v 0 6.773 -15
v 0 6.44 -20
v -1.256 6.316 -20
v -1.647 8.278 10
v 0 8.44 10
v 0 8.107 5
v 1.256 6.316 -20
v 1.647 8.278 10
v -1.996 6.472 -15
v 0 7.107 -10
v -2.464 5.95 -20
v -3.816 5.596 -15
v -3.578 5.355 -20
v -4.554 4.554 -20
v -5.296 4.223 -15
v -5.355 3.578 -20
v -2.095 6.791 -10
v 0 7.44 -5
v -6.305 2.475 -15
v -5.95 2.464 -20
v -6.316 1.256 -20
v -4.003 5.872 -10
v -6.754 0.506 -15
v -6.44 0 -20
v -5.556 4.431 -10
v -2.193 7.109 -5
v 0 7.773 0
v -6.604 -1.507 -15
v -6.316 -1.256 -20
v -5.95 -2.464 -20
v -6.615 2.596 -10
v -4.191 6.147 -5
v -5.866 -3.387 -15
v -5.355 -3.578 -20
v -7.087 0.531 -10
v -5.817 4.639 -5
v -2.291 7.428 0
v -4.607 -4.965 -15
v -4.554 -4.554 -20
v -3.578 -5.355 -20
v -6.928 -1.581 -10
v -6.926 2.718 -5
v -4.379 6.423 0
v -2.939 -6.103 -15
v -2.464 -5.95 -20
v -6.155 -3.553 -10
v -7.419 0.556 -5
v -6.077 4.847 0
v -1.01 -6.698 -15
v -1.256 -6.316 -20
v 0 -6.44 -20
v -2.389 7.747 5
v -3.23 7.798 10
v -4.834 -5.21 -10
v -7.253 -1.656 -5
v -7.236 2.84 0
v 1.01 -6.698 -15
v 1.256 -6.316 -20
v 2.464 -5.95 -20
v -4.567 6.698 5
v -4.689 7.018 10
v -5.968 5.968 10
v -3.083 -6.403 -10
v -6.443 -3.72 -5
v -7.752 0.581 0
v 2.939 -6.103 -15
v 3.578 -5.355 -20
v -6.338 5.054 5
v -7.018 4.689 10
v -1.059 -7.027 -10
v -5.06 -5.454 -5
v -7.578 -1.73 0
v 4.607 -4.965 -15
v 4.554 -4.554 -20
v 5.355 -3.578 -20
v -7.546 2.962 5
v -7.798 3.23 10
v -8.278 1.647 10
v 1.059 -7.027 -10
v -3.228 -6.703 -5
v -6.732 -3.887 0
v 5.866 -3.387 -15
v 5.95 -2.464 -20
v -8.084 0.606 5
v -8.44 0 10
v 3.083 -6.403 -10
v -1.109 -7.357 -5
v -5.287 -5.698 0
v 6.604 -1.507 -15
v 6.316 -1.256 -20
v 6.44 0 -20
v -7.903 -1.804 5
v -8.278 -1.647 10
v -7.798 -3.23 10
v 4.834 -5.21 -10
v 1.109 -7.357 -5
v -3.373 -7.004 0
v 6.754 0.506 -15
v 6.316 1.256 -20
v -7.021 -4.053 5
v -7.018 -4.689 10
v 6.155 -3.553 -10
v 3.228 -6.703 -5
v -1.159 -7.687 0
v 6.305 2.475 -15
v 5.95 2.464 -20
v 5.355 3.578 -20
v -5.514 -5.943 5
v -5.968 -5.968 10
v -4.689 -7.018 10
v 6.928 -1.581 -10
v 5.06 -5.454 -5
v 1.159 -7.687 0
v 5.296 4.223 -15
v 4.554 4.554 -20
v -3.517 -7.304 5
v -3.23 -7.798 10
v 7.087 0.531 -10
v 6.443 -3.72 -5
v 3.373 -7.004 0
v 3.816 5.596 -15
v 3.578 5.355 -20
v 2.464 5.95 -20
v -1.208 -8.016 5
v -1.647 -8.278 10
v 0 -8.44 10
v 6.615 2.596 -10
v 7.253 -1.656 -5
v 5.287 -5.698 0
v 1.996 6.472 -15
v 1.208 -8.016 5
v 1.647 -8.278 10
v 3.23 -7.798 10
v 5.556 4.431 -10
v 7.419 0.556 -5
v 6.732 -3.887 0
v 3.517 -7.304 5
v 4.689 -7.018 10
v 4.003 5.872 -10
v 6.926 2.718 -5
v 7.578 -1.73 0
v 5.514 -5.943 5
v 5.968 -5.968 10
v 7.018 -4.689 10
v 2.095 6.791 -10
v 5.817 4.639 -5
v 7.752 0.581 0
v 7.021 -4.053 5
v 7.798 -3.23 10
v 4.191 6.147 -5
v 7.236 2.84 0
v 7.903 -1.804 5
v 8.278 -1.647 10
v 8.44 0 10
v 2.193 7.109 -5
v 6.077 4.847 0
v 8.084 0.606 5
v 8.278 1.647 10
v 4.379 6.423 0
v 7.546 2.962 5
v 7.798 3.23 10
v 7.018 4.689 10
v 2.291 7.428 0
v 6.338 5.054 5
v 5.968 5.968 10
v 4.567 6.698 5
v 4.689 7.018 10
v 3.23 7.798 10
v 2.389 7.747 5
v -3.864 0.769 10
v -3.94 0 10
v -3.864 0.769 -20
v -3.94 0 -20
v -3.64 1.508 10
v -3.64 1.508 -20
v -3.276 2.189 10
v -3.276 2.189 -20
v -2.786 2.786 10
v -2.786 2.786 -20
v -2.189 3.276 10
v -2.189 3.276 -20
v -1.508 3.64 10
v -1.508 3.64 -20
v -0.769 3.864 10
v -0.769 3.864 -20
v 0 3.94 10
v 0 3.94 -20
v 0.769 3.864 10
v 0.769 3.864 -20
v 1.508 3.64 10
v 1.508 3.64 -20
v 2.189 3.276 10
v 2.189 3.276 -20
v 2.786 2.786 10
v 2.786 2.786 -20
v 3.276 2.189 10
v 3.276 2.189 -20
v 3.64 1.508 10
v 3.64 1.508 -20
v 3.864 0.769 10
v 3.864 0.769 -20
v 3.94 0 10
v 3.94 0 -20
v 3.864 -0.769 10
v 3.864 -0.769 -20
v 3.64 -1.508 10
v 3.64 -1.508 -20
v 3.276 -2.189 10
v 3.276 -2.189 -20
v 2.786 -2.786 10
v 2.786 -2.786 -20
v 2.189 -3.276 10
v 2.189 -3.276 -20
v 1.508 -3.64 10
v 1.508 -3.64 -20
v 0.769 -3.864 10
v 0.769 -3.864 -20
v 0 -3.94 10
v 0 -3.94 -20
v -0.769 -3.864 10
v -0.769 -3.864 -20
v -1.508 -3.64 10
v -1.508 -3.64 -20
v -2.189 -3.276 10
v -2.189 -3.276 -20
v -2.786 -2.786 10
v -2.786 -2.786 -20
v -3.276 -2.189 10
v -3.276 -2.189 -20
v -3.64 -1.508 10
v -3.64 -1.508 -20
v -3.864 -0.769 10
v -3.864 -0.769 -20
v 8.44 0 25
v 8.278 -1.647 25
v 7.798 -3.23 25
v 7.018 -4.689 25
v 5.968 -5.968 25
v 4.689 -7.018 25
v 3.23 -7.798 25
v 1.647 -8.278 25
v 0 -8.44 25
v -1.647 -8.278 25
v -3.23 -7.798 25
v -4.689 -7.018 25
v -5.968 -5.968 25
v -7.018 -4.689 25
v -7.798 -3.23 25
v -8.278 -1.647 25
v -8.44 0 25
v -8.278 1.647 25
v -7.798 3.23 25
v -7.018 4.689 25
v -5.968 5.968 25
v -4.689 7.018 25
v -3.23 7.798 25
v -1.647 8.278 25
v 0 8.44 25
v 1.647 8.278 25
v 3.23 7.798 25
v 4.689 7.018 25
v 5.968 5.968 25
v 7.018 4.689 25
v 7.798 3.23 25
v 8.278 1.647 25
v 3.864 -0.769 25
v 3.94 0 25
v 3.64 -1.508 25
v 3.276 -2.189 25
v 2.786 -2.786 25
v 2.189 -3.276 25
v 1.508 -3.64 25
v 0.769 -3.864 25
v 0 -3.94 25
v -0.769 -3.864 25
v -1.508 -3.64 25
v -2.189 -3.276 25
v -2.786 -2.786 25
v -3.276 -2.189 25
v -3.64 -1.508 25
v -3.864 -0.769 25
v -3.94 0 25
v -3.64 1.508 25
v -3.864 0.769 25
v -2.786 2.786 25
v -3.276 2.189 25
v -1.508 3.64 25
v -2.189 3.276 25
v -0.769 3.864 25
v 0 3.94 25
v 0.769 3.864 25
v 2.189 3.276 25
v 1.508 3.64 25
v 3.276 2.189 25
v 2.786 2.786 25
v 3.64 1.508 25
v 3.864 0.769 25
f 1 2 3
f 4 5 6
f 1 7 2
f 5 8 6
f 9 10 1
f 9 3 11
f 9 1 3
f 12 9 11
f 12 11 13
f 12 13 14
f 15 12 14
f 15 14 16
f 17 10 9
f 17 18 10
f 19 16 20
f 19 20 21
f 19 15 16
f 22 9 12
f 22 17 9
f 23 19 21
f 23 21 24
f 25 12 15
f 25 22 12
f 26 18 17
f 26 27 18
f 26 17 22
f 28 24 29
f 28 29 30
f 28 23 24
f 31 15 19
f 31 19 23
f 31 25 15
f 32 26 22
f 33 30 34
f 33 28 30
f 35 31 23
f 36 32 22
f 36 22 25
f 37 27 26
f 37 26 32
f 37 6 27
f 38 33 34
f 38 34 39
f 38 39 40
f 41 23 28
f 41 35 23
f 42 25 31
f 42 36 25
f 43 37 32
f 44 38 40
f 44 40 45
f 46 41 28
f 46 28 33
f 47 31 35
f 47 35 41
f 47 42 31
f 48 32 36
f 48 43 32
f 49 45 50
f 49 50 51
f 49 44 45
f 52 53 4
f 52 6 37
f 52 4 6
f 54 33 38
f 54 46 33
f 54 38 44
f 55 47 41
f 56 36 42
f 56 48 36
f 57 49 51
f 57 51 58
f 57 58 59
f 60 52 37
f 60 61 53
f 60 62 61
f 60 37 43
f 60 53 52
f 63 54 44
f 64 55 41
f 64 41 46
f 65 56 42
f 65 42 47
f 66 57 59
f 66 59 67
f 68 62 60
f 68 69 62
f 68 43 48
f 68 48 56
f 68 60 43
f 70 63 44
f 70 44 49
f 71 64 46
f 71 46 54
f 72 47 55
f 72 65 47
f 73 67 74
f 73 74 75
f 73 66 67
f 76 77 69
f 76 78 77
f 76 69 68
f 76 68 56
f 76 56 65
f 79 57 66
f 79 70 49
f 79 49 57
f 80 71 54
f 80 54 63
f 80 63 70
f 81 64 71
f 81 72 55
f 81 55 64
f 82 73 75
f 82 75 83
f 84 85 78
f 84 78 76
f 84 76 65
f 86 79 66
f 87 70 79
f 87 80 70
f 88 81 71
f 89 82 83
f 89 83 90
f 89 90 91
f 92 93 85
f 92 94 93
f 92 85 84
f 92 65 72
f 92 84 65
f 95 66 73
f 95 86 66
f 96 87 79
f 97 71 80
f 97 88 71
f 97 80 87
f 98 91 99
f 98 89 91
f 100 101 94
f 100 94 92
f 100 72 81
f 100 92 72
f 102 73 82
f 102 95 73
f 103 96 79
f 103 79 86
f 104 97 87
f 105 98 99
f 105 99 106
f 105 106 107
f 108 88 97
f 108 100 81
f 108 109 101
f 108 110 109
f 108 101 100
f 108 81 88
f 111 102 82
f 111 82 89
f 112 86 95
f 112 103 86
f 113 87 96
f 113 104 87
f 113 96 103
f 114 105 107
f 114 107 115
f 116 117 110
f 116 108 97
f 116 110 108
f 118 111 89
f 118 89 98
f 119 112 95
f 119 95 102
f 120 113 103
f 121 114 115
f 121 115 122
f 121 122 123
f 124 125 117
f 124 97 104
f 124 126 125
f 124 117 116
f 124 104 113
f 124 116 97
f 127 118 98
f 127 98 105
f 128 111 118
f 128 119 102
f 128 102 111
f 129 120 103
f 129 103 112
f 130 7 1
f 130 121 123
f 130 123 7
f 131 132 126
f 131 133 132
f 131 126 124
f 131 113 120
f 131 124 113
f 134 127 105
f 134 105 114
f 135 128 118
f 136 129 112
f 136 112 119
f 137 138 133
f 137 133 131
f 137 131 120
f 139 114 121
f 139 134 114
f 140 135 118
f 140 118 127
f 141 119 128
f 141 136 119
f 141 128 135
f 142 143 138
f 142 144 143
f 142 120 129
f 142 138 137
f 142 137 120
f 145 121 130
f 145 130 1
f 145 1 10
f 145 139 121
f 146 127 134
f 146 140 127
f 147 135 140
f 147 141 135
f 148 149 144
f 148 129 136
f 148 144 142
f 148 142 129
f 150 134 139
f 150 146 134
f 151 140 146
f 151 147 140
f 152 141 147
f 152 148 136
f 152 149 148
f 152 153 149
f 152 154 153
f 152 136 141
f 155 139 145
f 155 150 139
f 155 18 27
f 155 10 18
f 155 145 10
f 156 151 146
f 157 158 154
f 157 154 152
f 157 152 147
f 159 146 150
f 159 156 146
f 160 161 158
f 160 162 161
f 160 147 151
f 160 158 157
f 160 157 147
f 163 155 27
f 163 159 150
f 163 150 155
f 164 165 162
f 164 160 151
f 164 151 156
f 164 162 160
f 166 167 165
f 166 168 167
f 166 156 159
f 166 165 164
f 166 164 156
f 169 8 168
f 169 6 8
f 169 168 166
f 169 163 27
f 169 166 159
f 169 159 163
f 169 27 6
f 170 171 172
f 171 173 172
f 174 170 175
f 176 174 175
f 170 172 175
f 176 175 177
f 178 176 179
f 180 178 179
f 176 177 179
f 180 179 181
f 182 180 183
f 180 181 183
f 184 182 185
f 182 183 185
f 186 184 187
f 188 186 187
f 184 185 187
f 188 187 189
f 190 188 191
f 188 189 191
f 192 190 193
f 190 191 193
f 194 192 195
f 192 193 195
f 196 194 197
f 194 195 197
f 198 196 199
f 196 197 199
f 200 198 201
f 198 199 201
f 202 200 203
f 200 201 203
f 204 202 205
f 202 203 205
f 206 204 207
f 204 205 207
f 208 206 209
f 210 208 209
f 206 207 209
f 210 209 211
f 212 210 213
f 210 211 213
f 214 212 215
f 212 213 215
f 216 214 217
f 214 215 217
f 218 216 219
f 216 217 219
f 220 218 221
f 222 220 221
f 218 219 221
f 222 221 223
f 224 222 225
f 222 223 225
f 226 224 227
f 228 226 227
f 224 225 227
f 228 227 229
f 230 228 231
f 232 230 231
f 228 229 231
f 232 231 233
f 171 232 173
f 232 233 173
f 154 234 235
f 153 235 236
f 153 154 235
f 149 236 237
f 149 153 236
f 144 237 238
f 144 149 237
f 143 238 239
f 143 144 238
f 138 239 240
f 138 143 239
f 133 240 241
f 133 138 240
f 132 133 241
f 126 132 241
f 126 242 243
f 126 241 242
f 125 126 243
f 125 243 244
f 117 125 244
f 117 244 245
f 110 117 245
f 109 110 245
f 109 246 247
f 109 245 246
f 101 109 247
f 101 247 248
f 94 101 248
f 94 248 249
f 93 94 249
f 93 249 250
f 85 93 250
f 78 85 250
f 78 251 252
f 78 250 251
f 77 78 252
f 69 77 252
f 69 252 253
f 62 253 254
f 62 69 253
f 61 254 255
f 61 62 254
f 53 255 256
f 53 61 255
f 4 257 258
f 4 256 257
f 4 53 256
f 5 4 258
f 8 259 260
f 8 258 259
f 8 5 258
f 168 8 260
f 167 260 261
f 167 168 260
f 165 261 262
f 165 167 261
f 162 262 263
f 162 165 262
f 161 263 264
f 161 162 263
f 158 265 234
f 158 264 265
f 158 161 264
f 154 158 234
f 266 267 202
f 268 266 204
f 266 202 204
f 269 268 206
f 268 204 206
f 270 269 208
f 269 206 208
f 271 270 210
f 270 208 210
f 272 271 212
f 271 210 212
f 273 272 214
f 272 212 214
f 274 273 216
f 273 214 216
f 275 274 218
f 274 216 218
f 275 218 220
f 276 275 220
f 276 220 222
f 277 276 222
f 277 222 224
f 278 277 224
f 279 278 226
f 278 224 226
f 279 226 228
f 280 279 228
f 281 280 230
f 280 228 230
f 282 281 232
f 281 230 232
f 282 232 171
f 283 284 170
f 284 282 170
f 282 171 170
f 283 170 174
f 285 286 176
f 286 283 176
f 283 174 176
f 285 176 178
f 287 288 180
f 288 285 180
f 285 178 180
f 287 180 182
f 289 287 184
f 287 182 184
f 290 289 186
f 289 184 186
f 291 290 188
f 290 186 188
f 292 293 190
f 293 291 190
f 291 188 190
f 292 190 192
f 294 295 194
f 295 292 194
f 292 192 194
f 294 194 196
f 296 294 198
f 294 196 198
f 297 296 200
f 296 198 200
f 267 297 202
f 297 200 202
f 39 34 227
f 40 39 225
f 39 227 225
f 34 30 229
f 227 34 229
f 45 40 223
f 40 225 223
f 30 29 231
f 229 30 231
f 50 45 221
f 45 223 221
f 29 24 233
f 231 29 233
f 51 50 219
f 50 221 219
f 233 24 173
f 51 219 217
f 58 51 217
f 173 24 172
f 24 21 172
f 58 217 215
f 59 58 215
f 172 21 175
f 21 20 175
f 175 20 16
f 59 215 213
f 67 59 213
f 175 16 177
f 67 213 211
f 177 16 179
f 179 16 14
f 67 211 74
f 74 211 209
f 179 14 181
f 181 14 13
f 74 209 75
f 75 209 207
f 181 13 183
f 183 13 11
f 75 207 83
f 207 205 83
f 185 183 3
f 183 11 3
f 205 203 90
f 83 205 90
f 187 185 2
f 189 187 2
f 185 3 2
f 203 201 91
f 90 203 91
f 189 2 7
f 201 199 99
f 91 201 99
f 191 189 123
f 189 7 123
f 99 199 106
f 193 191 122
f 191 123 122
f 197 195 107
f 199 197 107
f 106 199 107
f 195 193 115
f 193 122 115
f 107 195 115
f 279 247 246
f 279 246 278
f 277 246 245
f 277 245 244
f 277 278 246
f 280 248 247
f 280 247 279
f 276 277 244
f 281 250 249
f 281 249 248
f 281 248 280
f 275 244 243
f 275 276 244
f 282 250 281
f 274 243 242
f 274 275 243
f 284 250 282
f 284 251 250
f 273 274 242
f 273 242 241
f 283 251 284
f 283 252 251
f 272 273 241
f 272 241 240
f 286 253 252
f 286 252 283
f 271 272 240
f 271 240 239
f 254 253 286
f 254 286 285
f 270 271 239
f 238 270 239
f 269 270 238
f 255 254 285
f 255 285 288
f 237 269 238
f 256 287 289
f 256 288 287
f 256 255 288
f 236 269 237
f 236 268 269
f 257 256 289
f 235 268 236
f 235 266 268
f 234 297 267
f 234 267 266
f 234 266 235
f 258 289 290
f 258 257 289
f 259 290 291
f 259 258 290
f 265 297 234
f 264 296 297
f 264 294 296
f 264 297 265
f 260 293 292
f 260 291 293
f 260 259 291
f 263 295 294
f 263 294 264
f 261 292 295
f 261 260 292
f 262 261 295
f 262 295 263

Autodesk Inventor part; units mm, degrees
ref_plane "YZ Plane" through (0, 0, 0) normal (1, 0, 0) x (0, 1, 0)
ref_plane "XZ Plane" through (0, 0, 0) normal (0, 1, 0) x (-1, 0, 0)
ref_plane "XY Plane" through (0, 0, 0) normal (0, 0, 1) x (1, 0, 0)
sketch "Sketch1" plane through (0, 0, 0) normal (0, 0, 1) x (1, 0, 0)
  circle A0 centre (0, 0) radius 7.94 construction
  circle A1 centre (0, 0) radius 8.44
  point P0 (0, 0)
  dimension "d5" = 0.5
extrude "Extrusion1" add sketch "Sketch1" along normal blind 10 and the other way blind 20
sketch "Sketch2" plane through (0, 0, 0) normal (1, 0, 0) x (0, 1, 0)
  line L0 (-8.44, -20) -> (8.44, -20) construction
  line L1 (8.44, 10) -> (-8.44, 10) construction
  line L2 (8.44, 10) -> (8.44, -20)
  line L3 (8.44, 10) -> (6.44, -20)
  line L4 (8.44, -20) -> (6.44, -20)
  line L5 (0, -26) -> (0, 16) projected
  point P0 (0, 0)
  dimension "d6" = 2
revolve "Revolution1" cut sketch "Sketch2" angle 360 about axis through (0, 0, 10) along (0, 0, 1)
sketch "Sketch3" plane through (0, 0, -20) normal (0, 0, -1) x (-1, 0, 0)
  circle A0 centre (0, 0) radius 6.44 construction
  circle A1 centre (0, 0) radius 3.94
  dimension "d8" = 2.5
extrude "Extrusion2" cut sketch "Sketch3" against normal through all
sketch "Sketch4" plane through (0, 0, 10) normal (0, 0, 1) x (1, 0, 0)
  circle A0 centre (0, 0) radius 3.94 projected
  circle A1 centre (0, 0) radius 8.44 projected
extrude "Extrusion3" add sketch "Sketch4" along normal blind 15
properties part number "Vented_plug"
